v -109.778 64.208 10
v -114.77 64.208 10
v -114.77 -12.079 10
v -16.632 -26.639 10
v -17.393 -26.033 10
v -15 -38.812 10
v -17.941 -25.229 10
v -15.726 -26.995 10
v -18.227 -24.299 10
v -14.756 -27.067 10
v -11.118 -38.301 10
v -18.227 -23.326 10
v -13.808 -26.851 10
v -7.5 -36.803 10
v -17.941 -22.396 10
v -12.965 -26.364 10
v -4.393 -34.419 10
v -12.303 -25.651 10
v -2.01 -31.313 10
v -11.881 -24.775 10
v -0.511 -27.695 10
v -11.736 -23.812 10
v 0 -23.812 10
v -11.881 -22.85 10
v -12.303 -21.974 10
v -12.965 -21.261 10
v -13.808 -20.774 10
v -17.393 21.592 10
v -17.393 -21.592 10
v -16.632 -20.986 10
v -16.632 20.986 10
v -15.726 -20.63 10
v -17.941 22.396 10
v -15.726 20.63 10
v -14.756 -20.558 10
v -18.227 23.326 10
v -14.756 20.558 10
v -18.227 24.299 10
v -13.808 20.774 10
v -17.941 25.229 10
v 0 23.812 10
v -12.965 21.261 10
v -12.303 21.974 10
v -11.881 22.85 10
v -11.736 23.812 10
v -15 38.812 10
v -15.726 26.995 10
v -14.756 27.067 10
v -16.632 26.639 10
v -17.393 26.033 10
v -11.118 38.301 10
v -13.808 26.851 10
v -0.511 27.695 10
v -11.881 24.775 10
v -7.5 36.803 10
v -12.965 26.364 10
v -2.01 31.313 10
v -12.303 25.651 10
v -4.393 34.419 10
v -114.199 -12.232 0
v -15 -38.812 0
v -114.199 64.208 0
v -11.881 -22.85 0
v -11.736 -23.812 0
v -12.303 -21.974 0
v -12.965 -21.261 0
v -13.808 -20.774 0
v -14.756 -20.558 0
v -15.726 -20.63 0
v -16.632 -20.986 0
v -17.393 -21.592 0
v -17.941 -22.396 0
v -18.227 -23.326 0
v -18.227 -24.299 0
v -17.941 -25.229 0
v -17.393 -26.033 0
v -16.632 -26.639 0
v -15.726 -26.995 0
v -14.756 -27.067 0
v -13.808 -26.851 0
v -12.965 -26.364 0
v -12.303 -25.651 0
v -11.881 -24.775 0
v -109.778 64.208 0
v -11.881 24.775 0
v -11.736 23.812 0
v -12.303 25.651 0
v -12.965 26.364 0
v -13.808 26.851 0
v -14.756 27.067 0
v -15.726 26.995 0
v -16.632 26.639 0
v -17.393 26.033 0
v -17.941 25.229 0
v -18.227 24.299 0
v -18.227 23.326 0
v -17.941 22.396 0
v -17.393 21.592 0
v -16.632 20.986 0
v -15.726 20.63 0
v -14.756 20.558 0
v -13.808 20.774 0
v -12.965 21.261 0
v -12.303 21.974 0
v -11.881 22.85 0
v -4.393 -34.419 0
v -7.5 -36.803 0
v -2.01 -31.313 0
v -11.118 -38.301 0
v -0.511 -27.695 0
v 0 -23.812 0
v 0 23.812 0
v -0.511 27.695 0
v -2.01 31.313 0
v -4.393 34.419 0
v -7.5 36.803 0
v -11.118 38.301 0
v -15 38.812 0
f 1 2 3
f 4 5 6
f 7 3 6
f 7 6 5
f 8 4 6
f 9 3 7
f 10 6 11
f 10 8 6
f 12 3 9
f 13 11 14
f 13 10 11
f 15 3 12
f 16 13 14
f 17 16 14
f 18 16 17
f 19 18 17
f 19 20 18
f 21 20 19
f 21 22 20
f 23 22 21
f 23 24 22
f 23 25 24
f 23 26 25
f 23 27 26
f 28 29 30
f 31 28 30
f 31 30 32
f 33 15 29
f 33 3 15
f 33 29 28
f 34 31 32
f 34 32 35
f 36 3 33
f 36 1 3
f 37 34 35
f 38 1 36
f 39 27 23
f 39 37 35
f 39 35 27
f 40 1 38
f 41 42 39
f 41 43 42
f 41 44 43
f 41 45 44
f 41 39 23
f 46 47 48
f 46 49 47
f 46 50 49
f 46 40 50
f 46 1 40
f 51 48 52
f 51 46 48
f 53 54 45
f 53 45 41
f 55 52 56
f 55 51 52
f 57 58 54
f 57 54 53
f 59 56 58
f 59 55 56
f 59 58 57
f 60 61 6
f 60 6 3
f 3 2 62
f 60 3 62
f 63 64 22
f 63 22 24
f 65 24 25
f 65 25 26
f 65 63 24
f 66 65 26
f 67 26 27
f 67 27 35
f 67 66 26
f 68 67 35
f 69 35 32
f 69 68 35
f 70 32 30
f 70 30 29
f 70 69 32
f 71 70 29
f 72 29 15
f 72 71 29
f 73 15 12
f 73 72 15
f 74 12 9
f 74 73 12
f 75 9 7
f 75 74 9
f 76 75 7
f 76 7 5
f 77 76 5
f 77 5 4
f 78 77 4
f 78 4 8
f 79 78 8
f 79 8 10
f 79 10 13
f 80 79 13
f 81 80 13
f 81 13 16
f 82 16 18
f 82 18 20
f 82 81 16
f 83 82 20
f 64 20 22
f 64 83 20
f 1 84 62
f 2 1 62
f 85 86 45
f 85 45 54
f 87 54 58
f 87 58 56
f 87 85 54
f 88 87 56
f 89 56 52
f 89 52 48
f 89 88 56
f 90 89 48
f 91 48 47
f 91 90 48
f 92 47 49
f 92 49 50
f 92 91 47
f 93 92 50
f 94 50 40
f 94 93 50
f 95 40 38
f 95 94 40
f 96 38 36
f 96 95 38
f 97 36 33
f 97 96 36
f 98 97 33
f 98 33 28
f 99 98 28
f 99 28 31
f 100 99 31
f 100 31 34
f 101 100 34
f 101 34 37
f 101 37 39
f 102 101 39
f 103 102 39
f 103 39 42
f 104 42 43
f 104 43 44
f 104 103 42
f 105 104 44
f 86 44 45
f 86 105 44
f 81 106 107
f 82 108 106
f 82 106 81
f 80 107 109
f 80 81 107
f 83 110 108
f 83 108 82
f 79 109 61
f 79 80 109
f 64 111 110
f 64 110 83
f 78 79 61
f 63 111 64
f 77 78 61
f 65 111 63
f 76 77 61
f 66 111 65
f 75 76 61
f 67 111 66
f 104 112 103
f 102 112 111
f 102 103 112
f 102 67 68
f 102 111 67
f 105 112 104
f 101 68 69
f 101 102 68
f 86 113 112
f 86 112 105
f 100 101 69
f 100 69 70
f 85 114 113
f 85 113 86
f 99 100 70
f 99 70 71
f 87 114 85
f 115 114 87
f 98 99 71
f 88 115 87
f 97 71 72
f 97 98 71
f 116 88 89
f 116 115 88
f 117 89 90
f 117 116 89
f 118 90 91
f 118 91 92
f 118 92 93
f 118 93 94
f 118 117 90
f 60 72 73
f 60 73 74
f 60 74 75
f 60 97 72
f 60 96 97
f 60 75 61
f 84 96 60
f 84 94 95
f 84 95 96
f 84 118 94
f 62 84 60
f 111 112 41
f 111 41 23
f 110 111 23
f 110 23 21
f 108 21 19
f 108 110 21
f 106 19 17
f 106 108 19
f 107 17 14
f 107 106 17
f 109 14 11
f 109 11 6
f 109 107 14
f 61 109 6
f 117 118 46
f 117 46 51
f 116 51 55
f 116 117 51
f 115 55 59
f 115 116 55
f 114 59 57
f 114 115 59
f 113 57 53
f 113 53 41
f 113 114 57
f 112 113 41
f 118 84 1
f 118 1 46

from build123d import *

# Parameters (mm, degrees)
SKETCH1_R               = 3.2639
BOSS_EXTRUDE1_DEPTH     = 10
SKETCH2_W               = 55.96454122
SKETCH2_H               = 39.556429901
BOSS_EXTRUDE2_DEPTH     = 50
CUT_EXTRUDE1_DEPTH      = 3.621876658
CUT_EXTRUDE1_DEPTH_BACK = 57.750909587
CUT_EXTRUDE3_DEPTH      = 104.020815944
BOSS_EXTRUDE3_REACH     = 105.021
SKETCH10_R              = 90
CUT_EXTRUDE4_DEPTH      = 50
CUT_EXTRUDE6_DEPTH      = 2.714029404
CUT_EXTRUDE6_DEPTH_BACK = 57.750909587


with BuildPart() as part:
    # Sketch1 → Boss-Extrude1 (new body)
    with BuildSketch(Plane.XY):
        with BuildLine():
            ThreePointArc((0, -23.8125), (-4.393398282, -34.419101718), (-15, -38.8125))
            Line((-15, -38.8125), (-119.778475404, -10.737192131))
            Line((-119.778475404, -10.737192131), (-119.778475404, 66.887807869))
            Line((-119.778475404, 66.887807869), (-15, 38.8125))
            ThreePointArc((-15, 38.8125), (-4.393398282, 34.419101718), (0, 23.8125))
            Line((0, 23.8125), (0, -23.8125))
        make_face()
        with Locations((-15, 23.8125)):
            Circle(SKETCH1_R, mode=Mode.SUBTRACT)
        with Locations((-15, -23.8125)):
            Circle(SKETCH1_R, mode=Mode.SUBTRACT)
    extrude(amount=BOSS_EXTRUDE1_DEPTH)

    # Sketch2 → Boss-Extrude2 (add)
    with BuildSketch(Plane.XY.offset(10)):
        with Locations((-137.760746014, 83.986530895)):
            Rectangle(SKETCH2_W, SKETCH2_H)
    extrude(amount=-BOSS_EXTRUDE2_DEPTH)

    # Sketch4 → Cut-Extrude1 (cut, two sides)
    with BuildSketch(Plane(origin=(-0.959208406, 0, 16.788657247), x_dir=(0, 1, 0), z_dir=(-0.057041289, 0, 0.99837182))) as cut_extrude1_sk:
        with BuildLine():
            ThreePointArc((64.208315944, 114.013041626), (81.708315944, 131.513041626), (64.208315944, 149.013041626))
            Line((64.208315944, 149.013041626), (64.208315944, 176.700065815))
            Line((64.208315944, 176.700065815), (111.984574651, 176.700065815))
            Line((111.984574651, 176.700065815), (111.984574651, 106.901315277))
            Line((111.984574651, 106.901315277), (64.208315944, 106.901315277))
            Line((64.208315944, 106.901315277), (64.208315944, 114.013041626))
        make_face()
        with BuildLine():
            Line((64.208315944, 144.013041626), (64.208315944, 119.013041626))
            ThreePointArc((64.208315944, 119.013041626), (76.708315944, 131.513041626), (64.208315944, 144.013041626))
        make_face()
    extrude(amount=CUT_EXTRUDE1_DEPTH, mode=Mode.SUBTRACT)
    extrude(cut_extrude1_sk.sketch, amount=-CUT_EXTRUDE1_DEPTH_BACK, mode=Mode.SUBTRACT)

    # Sketch7 → Cut-Extrude3 (cut, through all)
    with BuildSketch(Plane(origin=(0, 64.208315944, 0), x_dir=(1, 0, 0), z_dir=(0, 1, 0))):
        Polygon((-119.778475404, 0), (-119.207132269, 0), (-119.778475404, -10), align=None)
    extrude(amount=-CUT_EXTRUDE3_DEPTH, mode=Mode.SUBTRACT)

    # Boss-Extrude3: up to this face of the body (flat: up to its plane)
    boss_extrude3_end = Plane(part.part.faces().sort_by_distance((-67.246532084, -24.813083921, 5.004556479))[0])
    # Sketch8 → Boss-Extrude3 (add, up to the picked face)
    with BuildSketch(Plane.XZ.offset(-64.208315944), mode=Mode.PRIVATE) as boss_extrude3_sk1:
        Polygon((-119.207132269, 0), (-116.92175973, -40), (-111.913605554, -40), (-114.198978093, 0), align=None)
    boss_extrude3_tool1 = split(extrude(boss_extrude3_sk1.sketch, amount=BOSS_EXTRUDE3_REACH, mode=Mode.PRIVATE), bisect_by=boss_extrude3_end, keep=Keep.BOTH, mode=Mode.PRIVATE)
    add(boss_extrude3_tool1.solids().sort_by_distance((-115.560369, 64.208316, -20))[0])

    # Sketch10 → Cut-Extrude4 (cut)
    with BuildSketch(Plane(origin=(-113.827407897, 0, -6.503450805), x_dir=(0.057041289, 0, -0.99837182), z_dir=(0.99837182, 0, 0.057041289))):
        with Locations((83.472510719, -10.677332841)):
            Circle(SKETCH10_R)
    extrude(amount=-CUT_EXTRUDE4_DEPTH, mode=Mode.SUBTRACT)

    # Sketch14 → Cut-Extrude6 (cut, two sides)
    with BuildSketch(Plane(origin=(-0.959208406, 0, 16.788657247), x_dir=(0, 1, 0), z_dir=(-0.057041289, 0, 0.99837182))) as cut_extrude6_sk:
        Polygon((64.208315944, 114.013041626), (103.707100536, 114.013041626), (103.707100536, 158.820530176), (-53.093138129, 158.820530176), (-49.03095578, 114.013041626), align=None)
    extrude(amount=CUT_EXTRUDE6_DEPTH, mode=Mode.SUBTRACT)
    extrude(cut_extrude6_sk.sketch, amount=-CUT_EXTRUDE6_DEPTH_BACK, mode=Mode.SUBTRACT)


solid = part.part
